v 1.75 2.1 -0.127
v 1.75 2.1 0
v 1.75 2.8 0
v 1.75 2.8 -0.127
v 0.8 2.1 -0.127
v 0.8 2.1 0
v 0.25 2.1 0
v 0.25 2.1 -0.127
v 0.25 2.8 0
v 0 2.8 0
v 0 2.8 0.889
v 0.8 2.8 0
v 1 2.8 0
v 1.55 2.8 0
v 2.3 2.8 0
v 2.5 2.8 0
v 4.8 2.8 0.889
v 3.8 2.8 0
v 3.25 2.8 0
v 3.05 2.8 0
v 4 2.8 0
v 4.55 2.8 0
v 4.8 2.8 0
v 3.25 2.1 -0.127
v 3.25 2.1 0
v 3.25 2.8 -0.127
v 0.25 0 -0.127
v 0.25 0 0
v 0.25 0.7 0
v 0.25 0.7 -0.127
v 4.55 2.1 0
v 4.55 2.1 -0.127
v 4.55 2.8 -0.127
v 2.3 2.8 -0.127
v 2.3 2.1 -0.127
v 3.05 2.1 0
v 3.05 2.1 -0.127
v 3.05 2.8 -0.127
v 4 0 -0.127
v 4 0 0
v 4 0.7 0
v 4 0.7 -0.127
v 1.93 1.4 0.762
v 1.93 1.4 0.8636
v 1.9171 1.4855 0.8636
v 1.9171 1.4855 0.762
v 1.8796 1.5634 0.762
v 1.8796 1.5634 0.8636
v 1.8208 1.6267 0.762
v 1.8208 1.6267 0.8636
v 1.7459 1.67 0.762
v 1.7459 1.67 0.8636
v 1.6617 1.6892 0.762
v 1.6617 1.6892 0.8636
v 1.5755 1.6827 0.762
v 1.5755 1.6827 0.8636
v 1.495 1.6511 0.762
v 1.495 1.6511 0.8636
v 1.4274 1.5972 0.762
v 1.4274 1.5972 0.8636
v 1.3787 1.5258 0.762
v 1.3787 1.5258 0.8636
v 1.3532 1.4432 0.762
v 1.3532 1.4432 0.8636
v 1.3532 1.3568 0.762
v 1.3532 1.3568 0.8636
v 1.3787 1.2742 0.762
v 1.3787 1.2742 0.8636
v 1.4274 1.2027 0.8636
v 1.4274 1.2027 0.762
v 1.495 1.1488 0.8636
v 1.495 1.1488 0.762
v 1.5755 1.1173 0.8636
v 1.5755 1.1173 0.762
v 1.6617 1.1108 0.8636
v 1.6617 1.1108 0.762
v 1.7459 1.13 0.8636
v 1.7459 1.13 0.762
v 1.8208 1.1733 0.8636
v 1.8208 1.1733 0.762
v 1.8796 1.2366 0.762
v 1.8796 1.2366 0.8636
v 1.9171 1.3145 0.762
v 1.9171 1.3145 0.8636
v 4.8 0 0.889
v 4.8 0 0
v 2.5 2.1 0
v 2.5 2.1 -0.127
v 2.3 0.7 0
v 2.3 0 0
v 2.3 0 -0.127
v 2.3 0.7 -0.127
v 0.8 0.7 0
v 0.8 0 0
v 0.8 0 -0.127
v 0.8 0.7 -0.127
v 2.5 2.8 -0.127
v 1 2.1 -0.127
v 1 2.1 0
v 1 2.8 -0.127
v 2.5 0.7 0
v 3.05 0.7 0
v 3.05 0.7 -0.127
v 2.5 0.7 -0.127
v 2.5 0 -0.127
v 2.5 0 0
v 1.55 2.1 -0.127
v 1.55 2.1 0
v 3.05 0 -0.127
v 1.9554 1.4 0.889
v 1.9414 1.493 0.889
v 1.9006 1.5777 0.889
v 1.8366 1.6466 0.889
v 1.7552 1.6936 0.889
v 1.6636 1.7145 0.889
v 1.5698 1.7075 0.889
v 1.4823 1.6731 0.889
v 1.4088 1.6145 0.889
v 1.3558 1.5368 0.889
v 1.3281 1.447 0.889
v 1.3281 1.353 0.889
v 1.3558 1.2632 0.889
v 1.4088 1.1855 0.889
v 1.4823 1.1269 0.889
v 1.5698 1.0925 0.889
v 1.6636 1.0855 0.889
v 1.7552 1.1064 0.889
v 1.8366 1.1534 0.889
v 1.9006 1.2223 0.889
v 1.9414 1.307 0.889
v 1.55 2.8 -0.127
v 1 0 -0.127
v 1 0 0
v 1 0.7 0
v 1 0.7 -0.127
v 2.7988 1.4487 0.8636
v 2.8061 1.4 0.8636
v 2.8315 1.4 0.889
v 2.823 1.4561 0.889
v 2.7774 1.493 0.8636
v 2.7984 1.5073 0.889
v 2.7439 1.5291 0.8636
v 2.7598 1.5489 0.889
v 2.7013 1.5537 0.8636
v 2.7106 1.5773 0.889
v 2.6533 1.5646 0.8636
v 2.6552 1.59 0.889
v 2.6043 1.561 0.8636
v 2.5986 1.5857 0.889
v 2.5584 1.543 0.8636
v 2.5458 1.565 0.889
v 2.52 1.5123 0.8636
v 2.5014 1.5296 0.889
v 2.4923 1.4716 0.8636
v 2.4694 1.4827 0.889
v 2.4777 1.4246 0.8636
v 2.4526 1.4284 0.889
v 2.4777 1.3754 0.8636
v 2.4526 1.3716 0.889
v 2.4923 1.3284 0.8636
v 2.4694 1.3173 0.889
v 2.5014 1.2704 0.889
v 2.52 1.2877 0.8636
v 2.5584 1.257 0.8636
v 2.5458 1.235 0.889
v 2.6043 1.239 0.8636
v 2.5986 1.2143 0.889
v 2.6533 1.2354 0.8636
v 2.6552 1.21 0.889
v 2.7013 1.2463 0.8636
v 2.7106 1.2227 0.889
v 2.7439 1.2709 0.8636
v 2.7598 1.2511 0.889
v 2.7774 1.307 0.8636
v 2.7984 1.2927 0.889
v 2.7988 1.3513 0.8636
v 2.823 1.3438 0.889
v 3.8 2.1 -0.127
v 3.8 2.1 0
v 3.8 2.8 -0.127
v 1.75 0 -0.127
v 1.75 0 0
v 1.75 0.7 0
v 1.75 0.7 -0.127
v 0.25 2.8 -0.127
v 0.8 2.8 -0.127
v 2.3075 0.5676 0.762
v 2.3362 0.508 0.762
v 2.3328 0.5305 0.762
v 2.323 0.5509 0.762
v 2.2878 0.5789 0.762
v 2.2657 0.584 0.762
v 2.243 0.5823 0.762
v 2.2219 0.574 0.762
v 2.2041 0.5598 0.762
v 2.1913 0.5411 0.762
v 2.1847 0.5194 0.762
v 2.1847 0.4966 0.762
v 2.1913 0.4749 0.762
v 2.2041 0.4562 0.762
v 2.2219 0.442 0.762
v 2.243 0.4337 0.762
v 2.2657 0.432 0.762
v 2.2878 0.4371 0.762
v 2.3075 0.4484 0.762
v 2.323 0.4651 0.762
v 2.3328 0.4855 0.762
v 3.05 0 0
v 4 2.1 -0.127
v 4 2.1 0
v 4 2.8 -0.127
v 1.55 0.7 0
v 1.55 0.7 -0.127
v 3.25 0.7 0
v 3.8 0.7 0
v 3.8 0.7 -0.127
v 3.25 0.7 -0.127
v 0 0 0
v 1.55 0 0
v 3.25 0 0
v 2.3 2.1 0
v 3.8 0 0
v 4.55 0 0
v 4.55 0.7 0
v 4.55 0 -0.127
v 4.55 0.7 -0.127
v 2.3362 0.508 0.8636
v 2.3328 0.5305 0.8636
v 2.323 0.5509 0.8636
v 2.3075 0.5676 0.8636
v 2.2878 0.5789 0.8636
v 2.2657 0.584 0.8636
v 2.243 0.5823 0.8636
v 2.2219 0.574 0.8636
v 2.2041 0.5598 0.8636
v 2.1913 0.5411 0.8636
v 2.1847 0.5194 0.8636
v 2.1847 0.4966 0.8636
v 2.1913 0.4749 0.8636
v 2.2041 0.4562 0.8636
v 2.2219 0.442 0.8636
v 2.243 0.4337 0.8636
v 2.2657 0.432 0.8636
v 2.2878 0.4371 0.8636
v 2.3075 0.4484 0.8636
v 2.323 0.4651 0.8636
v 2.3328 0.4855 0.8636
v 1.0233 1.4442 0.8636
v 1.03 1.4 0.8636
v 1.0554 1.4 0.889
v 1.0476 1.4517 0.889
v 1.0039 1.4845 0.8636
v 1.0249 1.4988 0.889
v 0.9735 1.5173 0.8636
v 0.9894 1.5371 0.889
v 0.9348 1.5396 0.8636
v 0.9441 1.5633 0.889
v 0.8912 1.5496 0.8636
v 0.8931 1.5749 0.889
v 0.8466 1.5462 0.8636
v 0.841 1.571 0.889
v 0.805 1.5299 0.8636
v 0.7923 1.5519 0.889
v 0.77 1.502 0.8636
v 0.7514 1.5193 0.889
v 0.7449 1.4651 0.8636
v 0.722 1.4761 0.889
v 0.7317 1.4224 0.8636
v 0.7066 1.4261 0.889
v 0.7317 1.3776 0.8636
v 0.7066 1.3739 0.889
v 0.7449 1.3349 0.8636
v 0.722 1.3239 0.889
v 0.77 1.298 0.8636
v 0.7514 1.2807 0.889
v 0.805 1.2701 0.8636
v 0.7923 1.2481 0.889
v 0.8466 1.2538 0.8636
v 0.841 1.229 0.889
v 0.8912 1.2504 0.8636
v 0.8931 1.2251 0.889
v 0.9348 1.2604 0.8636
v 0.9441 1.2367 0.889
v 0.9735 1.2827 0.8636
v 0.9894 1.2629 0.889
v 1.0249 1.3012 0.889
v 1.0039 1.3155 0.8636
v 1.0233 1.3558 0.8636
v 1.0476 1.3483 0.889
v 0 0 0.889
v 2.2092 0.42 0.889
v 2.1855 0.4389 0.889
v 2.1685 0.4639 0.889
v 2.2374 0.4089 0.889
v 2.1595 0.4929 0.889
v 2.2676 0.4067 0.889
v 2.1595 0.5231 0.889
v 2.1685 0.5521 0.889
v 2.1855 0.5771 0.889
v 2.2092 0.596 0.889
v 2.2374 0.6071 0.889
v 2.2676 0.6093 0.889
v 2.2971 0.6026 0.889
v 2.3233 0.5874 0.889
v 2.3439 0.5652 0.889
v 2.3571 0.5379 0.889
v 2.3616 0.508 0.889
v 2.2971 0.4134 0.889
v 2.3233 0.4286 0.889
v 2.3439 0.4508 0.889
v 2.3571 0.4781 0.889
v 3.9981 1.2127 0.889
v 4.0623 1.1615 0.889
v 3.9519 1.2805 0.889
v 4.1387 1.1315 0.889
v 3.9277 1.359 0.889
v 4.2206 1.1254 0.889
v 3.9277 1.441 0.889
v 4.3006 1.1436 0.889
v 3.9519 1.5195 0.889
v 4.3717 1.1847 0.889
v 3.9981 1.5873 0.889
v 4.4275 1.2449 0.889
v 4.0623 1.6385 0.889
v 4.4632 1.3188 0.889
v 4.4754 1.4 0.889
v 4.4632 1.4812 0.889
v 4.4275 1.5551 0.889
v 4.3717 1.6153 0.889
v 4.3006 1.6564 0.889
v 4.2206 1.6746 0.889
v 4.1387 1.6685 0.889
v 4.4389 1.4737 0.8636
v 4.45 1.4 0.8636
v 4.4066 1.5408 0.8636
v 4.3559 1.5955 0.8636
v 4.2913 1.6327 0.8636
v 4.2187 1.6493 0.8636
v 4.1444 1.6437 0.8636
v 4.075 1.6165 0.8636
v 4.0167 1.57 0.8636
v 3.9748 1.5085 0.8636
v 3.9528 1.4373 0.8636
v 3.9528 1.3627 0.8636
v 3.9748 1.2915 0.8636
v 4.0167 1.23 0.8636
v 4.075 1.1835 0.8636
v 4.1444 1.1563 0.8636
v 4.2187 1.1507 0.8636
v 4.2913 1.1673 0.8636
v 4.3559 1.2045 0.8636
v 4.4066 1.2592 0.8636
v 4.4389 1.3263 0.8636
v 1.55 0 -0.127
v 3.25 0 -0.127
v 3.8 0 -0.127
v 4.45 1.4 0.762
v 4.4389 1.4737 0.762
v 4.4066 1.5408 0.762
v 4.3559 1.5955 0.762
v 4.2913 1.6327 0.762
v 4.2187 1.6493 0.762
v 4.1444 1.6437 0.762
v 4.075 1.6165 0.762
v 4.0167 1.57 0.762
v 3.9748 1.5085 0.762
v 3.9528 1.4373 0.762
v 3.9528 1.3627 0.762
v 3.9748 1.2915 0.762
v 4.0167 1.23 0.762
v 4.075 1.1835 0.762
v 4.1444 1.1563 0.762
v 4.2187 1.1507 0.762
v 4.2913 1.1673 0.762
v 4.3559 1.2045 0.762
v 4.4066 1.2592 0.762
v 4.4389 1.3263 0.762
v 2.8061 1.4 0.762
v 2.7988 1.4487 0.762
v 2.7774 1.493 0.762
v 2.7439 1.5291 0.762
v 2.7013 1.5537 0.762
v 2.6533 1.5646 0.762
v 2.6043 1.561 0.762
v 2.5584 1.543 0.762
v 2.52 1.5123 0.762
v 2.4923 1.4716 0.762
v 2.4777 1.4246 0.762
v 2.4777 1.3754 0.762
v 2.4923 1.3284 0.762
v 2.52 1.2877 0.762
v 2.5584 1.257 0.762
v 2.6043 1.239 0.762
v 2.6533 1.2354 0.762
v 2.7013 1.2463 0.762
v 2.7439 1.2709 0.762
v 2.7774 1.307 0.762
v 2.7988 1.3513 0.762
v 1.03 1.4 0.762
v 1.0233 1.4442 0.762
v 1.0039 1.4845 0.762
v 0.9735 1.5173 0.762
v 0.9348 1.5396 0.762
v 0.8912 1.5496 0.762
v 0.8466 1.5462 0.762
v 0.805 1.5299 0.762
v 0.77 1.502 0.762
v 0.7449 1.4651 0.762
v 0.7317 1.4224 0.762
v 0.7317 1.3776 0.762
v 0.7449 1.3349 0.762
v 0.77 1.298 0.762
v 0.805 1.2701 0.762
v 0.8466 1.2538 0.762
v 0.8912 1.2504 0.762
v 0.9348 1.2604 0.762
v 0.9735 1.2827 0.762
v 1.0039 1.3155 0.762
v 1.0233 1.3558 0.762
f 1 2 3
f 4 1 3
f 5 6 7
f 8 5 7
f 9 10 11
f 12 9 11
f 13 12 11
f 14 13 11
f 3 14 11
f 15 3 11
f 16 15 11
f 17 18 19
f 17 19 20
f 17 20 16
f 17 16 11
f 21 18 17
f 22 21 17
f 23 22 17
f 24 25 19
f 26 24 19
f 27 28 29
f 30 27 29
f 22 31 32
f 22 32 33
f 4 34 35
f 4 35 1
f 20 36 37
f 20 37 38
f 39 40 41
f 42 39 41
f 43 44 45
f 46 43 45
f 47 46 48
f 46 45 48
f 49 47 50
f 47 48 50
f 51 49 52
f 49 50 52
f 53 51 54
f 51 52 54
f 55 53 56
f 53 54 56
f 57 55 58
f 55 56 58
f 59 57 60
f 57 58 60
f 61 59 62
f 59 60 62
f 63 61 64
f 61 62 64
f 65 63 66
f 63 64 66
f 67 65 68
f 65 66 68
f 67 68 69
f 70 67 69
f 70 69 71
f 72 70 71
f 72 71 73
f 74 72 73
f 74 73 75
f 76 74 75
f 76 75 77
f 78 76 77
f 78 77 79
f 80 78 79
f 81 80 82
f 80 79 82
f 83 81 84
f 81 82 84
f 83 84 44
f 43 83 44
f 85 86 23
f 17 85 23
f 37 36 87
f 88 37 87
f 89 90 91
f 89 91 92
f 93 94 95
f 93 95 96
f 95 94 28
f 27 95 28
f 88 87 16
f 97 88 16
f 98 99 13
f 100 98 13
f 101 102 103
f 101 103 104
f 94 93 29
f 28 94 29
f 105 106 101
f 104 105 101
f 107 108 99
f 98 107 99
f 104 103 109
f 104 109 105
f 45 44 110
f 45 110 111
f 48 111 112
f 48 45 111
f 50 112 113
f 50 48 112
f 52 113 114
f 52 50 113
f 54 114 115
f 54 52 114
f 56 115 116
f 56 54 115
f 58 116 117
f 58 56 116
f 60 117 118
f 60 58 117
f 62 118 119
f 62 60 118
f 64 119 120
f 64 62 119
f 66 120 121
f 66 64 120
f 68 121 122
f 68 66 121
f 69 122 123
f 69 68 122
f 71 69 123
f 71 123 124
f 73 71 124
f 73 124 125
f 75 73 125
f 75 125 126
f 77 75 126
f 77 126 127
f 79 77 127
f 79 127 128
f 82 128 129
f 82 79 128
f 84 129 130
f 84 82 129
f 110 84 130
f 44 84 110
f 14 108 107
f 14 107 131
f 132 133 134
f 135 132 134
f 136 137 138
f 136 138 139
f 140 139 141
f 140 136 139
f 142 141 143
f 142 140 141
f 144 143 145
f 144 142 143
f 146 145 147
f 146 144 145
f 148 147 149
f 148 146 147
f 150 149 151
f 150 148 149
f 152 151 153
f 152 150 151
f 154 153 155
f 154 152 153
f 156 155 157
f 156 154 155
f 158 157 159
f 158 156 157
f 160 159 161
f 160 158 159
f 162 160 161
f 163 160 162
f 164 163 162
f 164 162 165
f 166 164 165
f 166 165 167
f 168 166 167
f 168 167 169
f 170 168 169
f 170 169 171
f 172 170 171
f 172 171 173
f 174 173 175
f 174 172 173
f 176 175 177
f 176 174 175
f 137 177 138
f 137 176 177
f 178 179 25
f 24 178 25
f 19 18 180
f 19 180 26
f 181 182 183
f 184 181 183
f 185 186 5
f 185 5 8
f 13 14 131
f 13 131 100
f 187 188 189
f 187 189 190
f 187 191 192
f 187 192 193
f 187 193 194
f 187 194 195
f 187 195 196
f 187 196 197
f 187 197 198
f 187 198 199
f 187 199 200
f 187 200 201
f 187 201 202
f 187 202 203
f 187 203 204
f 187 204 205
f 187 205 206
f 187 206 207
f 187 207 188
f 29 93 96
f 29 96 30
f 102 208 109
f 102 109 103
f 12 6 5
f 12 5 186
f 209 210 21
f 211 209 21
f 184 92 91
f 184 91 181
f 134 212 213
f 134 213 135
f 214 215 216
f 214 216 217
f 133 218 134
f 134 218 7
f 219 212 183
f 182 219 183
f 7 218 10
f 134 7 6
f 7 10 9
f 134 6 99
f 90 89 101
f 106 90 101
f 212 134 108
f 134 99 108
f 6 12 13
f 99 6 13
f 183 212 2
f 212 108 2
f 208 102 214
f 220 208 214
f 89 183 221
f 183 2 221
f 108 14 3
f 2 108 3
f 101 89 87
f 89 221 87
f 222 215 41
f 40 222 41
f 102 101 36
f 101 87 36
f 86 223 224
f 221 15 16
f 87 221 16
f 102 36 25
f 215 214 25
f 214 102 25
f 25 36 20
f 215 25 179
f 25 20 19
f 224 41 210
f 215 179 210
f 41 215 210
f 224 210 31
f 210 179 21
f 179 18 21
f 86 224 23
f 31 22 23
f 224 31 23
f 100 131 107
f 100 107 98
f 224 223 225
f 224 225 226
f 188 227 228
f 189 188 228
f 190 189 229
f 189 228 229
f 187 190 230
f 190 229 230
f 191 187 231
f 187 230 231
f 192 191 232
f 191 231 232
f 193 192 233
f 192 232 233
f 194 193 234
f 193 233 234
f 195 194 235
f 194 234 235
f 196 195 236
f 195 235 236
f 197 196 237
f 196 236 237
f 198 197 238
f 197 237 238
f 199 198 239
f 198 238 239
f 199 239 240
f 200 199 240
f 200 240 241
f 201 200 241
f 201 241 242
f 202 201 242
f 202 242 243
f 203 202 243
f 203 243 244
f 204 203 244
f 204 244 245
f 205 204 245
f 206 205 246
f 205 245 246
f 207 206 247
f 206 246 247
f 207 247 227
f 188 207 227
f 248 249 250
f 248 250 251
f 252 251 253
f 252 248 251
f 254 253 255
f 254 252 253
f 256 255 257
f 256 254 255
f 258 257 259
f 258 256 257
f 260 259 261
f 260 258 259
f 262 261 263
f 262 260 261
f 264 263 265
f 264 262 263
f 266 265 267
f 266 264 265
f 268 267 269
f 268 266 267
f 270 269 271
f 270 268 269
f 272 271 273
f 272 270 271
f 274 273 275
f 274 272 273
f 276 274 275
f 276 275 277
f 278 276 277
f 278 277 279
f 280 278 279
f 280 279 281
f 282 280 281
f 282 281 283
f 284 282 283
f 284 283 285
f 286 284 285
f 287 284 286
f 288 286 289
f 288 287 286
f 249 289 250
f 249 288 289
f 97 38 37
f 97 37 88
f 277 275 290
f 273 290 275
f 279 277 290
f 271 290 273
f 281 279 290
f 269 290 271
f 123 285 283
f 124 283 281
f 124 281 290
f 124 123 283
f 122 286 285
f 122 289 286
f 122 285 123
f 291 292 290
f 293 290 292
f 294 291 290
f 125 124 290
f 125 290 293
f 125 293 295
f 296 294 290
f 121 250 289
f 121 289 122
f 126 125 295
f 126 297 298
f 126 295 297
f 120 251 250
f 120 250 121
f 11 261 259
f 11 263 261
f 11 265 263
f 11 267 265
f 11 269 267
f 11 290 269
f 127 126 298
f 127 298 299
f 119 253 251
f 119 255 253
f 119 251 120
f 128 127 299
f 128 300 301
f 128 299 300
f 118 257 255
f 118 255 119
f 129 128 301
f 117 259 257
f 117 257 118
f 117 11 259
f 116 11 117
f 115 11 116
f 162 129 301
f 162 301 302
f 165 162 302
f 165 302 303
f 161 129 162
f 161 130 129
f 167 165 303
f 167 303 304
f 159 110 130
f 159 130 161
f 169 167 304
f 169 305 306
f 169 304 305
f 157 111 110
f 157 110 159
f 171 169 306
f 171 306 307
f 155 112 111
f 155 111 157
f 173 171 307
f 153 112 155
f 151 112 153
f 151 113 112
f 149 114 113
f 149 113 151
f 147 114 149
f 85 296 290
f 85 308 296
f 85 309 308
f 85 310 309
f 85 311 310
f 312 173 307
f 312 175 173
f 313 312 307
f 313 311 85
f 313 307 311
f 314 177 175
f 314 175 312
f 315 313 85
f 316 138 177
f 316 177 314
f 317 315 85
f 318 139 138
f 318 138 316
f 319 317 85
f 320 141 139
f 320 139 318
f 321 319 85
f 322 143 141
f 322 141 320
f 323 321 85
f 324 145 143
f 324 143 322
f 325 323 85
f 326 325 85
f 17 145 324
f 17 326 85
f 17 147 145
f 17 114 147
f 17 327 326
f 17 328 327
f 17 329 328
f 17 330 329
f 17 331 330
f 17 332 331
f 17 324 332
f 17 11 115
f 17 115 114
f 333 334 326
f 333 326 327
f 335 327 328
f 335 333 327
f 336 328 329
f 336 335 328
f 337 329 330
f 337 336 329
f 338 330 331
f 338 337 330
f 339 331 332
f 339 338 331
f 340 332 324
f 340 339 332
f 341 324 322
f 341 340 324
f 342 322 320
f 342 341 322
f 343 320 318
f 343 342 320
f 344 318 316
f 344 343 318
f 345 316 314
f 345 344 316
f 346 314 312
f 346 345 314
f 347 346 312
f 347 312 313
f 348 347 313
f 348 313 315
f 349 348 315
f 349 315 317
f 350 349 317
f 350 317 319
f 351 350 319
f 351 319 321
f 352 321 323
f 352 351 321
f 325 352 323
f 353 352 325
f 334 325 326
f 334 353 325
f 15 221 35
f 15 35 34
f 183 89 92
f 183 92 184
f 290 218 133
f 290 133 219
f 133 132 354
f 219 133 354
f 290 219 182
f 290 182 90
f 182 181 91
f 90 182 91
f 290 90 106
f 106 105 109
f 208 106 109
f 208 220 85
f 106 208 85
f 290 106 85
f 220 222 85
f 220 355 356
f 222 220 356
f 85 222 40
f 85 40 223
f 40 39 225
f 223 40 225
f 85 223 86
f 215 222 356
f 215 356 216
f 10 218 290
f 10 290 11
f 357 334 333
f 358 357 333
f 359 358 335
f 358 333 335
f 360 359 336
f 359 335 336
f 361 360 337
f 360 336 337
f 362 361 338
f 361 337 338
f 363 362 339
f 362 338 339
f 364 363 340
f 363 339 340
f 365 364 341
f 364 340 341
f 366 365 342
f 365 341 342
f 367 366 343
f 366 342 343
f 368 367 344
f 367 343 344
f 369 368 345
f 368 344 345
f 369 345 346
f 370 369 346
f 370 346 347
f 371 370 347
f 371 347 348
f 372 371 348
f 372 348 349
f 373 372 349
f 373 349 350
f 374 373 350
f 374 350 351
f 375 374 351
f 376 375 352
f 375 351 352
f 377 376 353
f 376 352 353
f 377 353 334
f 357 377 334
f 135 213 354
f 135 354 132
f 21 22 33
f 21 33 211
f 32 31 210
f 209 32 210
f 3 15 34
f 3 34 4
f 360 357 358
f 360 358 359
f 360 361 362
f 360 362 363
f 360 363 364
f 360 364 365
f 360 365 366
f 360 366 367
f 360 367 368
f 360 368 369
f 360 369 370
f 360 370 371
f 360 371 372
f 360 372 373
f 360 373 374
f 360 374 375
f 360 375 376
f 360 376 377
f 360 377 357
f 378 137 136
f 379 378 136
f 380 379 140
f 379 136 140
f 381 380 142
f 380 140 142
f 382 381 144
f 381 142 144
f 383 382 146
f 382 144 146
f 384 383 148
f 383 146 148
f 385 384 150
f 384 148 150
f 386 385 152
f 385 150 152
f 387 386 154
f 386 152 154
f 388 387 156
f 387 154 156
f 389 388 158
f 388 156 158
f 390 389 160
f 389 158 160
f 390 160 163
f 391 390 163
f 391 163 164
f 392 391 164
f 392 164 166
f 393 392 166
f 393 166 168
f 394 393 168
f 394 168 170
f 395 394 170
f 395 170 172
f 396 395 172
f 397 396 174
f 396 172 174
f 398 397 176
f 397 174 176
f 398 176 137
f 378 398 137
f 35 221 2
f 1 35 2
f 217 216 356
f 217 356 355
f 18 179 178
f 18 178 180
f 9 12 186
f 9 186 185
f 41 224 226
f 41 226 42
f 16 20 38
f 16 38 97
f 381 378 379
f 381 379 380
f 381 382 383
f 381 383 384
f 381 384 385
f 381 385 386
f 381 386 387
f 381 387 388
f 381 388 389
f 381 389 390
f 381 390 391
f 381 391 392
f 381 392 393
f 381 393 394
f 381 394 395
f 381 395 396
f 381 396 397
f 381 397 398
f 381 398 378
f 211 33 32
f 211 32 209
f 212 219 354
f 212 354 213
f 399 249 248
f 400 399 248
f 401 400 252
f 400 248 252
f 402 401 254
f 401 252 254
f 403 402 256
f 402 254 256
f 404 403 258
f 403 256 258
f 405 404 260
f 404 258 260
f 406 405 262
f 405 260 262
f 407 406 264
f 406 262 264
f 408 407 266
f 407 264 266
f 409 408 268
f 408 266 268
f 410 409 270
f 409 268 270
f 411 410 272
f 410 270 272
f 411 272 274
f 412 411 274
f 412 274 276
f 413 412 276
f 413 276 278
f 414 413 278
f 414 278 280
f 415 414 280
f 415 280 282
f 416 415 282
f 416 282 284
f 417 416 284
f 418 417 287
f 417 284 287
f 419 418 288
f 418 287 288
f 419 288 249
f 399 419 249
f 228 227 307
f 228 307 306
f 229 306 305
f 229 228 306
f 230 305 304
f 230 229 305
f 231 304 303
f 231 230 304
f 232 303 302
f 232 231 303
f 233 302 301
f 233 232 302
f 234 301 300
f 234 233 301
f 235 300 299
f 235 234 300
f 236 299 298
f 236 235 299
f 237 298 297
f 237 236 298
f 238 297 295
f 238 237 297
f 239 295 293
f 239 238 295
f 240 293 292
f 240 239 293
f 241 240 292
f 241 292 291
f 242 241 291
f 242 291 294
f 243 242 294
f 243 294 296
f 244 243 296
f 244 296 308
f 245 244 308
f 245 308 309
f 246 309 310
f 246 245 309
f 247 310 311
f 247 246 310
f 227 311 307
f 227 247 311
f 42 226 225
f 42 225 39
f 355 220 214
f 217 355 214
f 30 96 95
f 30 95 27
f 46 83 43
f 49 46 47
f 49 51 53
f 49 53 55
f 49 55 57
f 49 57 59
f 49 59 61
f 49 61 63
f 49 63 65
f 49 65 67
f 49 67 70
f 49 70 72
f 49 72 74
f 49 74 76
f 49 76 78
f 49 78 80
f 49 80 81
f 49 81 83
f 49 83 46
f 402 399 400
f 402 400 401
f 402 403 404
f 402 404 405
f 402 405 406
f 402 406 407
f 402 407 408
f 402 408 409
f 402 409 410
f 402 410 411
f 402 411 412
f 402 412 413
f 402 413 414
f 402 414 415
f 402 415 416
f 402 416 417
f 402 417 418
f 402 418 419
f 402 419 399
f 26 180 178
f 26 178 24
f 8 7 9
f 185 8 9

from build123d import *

# Parameters (mm, degrees)
SKETCH1_W            = 4.8
SKETCH1_H            = 2.7999944
BOSS_EXTRUDE3_DEPTH  = 0.889
SKETCH5_R            = 0.15
SKETCH5_R_2          = 0.29
SKETCH5_R_3          = 0.1651
SKETCH5_R_4          = 0.0762
SKETCH5_R_5          = 0.25
CUT_EXTRUDE2_DEPTH   = 0.127
CHAMFER2_SIZE        = 0.0254
SKETCH6_W            = 0.55
SKETCH6_H            = 0.7
BOSS_EXTRUDE4_DEPTH  = 0.127
LPATTERN1_COUNT      = 6
LPATTERN1_PITCH      = 0.75
LPATTERN1_COUNT_DIR2 = 2
LPATTERN1_PITCH_DIR2 = 2.1


with BuildPart() as part:
    # Sketch1 → Boss-Extrude3 (new body)
    with BuildSketch(Plane.XY):
        with Locations((2.4, 1.3999972)):
            Rectangle(SKETCH1_W, SKETCH1_H)
    extrude(amount=BOSS_EXTRUDE3_DEPTH)

    # Sketch5 → Cut-Extrude2 (cut)
    with BuildSketch(Plane.XY.offset(0.889)):
        with Locations((0.88, 1.3999972)):
            Circle(SKETCH5_R)
        with Locations((1.64, 1.3999972)):
            Circle(SKETCH5_R_2)
        with Locations((2.641, 1.3999972)):
            Circle(SKETCH5_R_3)
        with Locations((2.26, 0.508)):
            Circle(SKETCH5_R_4)
        with Locations((4.2, 1.3999972)):
            Circle(SKETCH5_R_5)
    extrude(amount=-CUT_EXTRUDE2_DEPTH, mode=Mode.SUBTRACT)

    # Chamfer2
    chamfer2_edges = [part.edges().sort_by_distance(p)[0] for p in [
        (0.73, 1.3999972, 0.889),
        (1.35, 1.3999972, 0.889),
        (2.4759, 1.3999972, 0.889),
        (2.1838, 0.508, 0.889),
        (3.95, 1.3999972, 0.889),
    ]]
    chamfer(chamfer2_edges, length=CHAMFER2_SIZE)


with BuildPart() as body_2:
    # Sketch6 → Boss-Extrude4 (new body)
    with BuildSketch(Plane(origin=(0, 0, 0), x_dir=(-1, 0, 0), z_dir=(0, 0, -1))):
        with Locations((-0.525, 0.35)):
            Rectangle(SKETCH6_W, SKETCH6_H)
    boss_extrude4 = extrude(amount=BOSS_EXTRUDE4_DEPTH)


with BuildPart() as part_1:
    add(part.part)

    # LPattern1: Boss-Extrude4 6 × 2
    with Locations(*[(i * LPATTERN1_PITCH, j * LPATTERN1_PITCH_DIR2, 0) for i in range(LPATTERN1_COUNT) for j in range(LPATTERN1_COUNT_DIR2) if (i, j) != (0, 0)]):
        add(boss_extrude4)


solid = Compound([body_2.part, part_1.part])
